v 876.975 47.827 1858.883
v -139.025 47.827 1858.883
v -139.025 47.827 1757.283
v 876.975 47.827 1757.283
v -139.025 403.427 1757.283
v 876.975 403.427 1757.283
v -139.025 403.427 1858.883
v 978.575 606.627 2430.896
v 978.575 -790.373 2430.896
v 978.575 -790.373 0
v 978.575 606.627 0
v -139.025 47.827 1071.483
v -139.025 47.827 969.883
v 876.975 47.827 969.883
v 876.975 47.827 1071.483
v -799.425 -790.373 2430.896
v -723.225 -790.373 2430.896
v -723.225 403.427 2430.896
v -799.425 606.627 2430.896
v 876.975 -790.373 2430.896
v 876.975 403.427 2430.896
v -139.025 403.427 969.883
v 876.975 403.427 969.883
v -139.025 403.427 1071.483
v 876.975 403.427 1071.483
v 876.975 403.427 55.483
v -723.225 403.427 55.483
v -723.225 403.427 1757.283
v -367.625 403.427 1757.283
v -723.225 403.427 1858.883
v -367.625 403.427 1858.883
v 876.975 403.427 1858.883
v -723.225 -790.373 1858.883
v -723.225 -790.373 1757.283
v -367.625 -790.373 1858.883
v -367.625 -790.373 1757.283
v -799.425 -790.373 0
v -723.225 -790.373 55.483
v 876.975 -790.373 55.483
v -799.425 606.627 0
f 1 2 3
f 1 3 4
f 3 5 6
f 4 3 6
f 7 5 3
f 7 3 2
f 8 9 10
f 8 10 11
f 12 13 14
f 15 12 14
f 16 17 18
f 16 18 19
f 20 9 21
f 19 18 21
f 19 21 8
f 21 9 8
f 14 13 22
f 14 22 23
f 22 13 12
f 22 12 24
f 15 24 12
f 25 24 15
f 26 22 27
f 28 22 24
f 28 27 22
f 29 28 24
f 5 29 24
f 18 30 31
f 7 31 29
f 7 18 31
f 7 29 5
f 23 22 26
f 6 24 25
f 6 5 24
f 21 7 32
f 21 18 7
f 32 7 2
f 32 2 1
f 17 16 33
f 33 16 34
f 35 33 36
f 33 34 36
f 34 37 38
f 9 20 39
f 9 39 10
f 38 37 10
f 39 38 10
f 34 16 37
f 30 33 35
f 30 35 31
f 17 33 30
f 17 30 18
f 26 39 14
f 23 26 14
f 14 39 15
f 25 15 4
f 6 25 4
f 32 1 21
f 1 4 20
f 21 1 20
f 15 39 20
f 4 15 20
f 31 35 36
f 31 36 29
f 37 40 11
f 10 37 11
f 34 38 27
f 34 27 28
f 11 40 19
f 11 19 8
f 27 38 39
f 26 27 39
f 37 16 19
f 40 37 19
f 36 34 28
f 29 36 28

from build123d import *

# Parameters (mm, degrees)
F0_W      = 1778
F0_H      = 1397
F1_DEPTH  = 2976.48255
F2_W      = 1600.2
F2_H      = 2921
F3_DEPTH  = 1193.8
F4_W      = 1016
F4_H      = 355.6
F5_DEPTH  = 1016
F6_W      = 1016
F6_H      = 914.4
F7_DEPTH  = 355.6
F8_W      = 1193.8
F8_H      = 101.6
F9_DEPTH  = 355.6
F10_W     = 1016
F10_H     = 101.6
F11_DEPTH = 355.6
F12_W     = 1397
F12_H     = 545.586983
F13_DEPTH = 2540


with BuildPart() as f1:
    # F0 (on Top) → F1 (new body)
    with BuildSketch(Plane.XY):
        with Locations((89.574512, -91.872729)):
            Rectangle(F0_W, F0_H)
    extrude(amount=F1_DEPTH)

    # F2 (on face) → F3 (cut)
    with BuildSketch(Plane.XZ.offset(790.372729)):
        with Locations((76.874512, 1515.98255)):
            Rectangle(F2_W, F2_H)
    extrude(amount=-F3_DEPTH, mode=Mode.SUBTRACT)

    # F4 (on face) → F5 (join)
    with BuildSketch(Plane.XY.offset(55.48255)):
        with Locations((368.974512, 225.627271)):
            Rectangle(F4_W, F4_H)
    extrude(amount=F5_DEPTH)

    # F6 (on face) → F7 (cut)
    with BuildSketch(Plane.XZ.offset(-47.827271)):
        with Locations((368.974512, 512.68255)):
            Rectangle(F6_W, F6_H)
    extrude(amount=-F7_DEPTH, mode=Mode.SUBTRACT)

    # F8 (on face) → F9 (join)
    with BuildSketch(Plane.YZ.offset(-723.225488)):
        with Locations((-193.472729, 1808.08255)):
            Rectangle(F8_W, F8_H)
    extrude(amount=F9_DEPTH)

    # F10 (on face) → F11 (join)
    with BuildSketch(Plane.XZ.offset(-403.427271)):
        with Locations((368.974512, 1808.08255)):
            Rectangle(F10_W, F10_H)
    extrude(amount=F11_DEPTH)

    # F12 (on face) → F13 (cut)
    with BuildSketch(Plane.YZ.offset(978.574512)):
        with Locations((-91.872729, 2703.689059)):
            Rectangle(F12_W, F12_H)
    extrude(amount=-F13_DEPTH, mode=Mode.SUBTRACT)


solid = f1.part
